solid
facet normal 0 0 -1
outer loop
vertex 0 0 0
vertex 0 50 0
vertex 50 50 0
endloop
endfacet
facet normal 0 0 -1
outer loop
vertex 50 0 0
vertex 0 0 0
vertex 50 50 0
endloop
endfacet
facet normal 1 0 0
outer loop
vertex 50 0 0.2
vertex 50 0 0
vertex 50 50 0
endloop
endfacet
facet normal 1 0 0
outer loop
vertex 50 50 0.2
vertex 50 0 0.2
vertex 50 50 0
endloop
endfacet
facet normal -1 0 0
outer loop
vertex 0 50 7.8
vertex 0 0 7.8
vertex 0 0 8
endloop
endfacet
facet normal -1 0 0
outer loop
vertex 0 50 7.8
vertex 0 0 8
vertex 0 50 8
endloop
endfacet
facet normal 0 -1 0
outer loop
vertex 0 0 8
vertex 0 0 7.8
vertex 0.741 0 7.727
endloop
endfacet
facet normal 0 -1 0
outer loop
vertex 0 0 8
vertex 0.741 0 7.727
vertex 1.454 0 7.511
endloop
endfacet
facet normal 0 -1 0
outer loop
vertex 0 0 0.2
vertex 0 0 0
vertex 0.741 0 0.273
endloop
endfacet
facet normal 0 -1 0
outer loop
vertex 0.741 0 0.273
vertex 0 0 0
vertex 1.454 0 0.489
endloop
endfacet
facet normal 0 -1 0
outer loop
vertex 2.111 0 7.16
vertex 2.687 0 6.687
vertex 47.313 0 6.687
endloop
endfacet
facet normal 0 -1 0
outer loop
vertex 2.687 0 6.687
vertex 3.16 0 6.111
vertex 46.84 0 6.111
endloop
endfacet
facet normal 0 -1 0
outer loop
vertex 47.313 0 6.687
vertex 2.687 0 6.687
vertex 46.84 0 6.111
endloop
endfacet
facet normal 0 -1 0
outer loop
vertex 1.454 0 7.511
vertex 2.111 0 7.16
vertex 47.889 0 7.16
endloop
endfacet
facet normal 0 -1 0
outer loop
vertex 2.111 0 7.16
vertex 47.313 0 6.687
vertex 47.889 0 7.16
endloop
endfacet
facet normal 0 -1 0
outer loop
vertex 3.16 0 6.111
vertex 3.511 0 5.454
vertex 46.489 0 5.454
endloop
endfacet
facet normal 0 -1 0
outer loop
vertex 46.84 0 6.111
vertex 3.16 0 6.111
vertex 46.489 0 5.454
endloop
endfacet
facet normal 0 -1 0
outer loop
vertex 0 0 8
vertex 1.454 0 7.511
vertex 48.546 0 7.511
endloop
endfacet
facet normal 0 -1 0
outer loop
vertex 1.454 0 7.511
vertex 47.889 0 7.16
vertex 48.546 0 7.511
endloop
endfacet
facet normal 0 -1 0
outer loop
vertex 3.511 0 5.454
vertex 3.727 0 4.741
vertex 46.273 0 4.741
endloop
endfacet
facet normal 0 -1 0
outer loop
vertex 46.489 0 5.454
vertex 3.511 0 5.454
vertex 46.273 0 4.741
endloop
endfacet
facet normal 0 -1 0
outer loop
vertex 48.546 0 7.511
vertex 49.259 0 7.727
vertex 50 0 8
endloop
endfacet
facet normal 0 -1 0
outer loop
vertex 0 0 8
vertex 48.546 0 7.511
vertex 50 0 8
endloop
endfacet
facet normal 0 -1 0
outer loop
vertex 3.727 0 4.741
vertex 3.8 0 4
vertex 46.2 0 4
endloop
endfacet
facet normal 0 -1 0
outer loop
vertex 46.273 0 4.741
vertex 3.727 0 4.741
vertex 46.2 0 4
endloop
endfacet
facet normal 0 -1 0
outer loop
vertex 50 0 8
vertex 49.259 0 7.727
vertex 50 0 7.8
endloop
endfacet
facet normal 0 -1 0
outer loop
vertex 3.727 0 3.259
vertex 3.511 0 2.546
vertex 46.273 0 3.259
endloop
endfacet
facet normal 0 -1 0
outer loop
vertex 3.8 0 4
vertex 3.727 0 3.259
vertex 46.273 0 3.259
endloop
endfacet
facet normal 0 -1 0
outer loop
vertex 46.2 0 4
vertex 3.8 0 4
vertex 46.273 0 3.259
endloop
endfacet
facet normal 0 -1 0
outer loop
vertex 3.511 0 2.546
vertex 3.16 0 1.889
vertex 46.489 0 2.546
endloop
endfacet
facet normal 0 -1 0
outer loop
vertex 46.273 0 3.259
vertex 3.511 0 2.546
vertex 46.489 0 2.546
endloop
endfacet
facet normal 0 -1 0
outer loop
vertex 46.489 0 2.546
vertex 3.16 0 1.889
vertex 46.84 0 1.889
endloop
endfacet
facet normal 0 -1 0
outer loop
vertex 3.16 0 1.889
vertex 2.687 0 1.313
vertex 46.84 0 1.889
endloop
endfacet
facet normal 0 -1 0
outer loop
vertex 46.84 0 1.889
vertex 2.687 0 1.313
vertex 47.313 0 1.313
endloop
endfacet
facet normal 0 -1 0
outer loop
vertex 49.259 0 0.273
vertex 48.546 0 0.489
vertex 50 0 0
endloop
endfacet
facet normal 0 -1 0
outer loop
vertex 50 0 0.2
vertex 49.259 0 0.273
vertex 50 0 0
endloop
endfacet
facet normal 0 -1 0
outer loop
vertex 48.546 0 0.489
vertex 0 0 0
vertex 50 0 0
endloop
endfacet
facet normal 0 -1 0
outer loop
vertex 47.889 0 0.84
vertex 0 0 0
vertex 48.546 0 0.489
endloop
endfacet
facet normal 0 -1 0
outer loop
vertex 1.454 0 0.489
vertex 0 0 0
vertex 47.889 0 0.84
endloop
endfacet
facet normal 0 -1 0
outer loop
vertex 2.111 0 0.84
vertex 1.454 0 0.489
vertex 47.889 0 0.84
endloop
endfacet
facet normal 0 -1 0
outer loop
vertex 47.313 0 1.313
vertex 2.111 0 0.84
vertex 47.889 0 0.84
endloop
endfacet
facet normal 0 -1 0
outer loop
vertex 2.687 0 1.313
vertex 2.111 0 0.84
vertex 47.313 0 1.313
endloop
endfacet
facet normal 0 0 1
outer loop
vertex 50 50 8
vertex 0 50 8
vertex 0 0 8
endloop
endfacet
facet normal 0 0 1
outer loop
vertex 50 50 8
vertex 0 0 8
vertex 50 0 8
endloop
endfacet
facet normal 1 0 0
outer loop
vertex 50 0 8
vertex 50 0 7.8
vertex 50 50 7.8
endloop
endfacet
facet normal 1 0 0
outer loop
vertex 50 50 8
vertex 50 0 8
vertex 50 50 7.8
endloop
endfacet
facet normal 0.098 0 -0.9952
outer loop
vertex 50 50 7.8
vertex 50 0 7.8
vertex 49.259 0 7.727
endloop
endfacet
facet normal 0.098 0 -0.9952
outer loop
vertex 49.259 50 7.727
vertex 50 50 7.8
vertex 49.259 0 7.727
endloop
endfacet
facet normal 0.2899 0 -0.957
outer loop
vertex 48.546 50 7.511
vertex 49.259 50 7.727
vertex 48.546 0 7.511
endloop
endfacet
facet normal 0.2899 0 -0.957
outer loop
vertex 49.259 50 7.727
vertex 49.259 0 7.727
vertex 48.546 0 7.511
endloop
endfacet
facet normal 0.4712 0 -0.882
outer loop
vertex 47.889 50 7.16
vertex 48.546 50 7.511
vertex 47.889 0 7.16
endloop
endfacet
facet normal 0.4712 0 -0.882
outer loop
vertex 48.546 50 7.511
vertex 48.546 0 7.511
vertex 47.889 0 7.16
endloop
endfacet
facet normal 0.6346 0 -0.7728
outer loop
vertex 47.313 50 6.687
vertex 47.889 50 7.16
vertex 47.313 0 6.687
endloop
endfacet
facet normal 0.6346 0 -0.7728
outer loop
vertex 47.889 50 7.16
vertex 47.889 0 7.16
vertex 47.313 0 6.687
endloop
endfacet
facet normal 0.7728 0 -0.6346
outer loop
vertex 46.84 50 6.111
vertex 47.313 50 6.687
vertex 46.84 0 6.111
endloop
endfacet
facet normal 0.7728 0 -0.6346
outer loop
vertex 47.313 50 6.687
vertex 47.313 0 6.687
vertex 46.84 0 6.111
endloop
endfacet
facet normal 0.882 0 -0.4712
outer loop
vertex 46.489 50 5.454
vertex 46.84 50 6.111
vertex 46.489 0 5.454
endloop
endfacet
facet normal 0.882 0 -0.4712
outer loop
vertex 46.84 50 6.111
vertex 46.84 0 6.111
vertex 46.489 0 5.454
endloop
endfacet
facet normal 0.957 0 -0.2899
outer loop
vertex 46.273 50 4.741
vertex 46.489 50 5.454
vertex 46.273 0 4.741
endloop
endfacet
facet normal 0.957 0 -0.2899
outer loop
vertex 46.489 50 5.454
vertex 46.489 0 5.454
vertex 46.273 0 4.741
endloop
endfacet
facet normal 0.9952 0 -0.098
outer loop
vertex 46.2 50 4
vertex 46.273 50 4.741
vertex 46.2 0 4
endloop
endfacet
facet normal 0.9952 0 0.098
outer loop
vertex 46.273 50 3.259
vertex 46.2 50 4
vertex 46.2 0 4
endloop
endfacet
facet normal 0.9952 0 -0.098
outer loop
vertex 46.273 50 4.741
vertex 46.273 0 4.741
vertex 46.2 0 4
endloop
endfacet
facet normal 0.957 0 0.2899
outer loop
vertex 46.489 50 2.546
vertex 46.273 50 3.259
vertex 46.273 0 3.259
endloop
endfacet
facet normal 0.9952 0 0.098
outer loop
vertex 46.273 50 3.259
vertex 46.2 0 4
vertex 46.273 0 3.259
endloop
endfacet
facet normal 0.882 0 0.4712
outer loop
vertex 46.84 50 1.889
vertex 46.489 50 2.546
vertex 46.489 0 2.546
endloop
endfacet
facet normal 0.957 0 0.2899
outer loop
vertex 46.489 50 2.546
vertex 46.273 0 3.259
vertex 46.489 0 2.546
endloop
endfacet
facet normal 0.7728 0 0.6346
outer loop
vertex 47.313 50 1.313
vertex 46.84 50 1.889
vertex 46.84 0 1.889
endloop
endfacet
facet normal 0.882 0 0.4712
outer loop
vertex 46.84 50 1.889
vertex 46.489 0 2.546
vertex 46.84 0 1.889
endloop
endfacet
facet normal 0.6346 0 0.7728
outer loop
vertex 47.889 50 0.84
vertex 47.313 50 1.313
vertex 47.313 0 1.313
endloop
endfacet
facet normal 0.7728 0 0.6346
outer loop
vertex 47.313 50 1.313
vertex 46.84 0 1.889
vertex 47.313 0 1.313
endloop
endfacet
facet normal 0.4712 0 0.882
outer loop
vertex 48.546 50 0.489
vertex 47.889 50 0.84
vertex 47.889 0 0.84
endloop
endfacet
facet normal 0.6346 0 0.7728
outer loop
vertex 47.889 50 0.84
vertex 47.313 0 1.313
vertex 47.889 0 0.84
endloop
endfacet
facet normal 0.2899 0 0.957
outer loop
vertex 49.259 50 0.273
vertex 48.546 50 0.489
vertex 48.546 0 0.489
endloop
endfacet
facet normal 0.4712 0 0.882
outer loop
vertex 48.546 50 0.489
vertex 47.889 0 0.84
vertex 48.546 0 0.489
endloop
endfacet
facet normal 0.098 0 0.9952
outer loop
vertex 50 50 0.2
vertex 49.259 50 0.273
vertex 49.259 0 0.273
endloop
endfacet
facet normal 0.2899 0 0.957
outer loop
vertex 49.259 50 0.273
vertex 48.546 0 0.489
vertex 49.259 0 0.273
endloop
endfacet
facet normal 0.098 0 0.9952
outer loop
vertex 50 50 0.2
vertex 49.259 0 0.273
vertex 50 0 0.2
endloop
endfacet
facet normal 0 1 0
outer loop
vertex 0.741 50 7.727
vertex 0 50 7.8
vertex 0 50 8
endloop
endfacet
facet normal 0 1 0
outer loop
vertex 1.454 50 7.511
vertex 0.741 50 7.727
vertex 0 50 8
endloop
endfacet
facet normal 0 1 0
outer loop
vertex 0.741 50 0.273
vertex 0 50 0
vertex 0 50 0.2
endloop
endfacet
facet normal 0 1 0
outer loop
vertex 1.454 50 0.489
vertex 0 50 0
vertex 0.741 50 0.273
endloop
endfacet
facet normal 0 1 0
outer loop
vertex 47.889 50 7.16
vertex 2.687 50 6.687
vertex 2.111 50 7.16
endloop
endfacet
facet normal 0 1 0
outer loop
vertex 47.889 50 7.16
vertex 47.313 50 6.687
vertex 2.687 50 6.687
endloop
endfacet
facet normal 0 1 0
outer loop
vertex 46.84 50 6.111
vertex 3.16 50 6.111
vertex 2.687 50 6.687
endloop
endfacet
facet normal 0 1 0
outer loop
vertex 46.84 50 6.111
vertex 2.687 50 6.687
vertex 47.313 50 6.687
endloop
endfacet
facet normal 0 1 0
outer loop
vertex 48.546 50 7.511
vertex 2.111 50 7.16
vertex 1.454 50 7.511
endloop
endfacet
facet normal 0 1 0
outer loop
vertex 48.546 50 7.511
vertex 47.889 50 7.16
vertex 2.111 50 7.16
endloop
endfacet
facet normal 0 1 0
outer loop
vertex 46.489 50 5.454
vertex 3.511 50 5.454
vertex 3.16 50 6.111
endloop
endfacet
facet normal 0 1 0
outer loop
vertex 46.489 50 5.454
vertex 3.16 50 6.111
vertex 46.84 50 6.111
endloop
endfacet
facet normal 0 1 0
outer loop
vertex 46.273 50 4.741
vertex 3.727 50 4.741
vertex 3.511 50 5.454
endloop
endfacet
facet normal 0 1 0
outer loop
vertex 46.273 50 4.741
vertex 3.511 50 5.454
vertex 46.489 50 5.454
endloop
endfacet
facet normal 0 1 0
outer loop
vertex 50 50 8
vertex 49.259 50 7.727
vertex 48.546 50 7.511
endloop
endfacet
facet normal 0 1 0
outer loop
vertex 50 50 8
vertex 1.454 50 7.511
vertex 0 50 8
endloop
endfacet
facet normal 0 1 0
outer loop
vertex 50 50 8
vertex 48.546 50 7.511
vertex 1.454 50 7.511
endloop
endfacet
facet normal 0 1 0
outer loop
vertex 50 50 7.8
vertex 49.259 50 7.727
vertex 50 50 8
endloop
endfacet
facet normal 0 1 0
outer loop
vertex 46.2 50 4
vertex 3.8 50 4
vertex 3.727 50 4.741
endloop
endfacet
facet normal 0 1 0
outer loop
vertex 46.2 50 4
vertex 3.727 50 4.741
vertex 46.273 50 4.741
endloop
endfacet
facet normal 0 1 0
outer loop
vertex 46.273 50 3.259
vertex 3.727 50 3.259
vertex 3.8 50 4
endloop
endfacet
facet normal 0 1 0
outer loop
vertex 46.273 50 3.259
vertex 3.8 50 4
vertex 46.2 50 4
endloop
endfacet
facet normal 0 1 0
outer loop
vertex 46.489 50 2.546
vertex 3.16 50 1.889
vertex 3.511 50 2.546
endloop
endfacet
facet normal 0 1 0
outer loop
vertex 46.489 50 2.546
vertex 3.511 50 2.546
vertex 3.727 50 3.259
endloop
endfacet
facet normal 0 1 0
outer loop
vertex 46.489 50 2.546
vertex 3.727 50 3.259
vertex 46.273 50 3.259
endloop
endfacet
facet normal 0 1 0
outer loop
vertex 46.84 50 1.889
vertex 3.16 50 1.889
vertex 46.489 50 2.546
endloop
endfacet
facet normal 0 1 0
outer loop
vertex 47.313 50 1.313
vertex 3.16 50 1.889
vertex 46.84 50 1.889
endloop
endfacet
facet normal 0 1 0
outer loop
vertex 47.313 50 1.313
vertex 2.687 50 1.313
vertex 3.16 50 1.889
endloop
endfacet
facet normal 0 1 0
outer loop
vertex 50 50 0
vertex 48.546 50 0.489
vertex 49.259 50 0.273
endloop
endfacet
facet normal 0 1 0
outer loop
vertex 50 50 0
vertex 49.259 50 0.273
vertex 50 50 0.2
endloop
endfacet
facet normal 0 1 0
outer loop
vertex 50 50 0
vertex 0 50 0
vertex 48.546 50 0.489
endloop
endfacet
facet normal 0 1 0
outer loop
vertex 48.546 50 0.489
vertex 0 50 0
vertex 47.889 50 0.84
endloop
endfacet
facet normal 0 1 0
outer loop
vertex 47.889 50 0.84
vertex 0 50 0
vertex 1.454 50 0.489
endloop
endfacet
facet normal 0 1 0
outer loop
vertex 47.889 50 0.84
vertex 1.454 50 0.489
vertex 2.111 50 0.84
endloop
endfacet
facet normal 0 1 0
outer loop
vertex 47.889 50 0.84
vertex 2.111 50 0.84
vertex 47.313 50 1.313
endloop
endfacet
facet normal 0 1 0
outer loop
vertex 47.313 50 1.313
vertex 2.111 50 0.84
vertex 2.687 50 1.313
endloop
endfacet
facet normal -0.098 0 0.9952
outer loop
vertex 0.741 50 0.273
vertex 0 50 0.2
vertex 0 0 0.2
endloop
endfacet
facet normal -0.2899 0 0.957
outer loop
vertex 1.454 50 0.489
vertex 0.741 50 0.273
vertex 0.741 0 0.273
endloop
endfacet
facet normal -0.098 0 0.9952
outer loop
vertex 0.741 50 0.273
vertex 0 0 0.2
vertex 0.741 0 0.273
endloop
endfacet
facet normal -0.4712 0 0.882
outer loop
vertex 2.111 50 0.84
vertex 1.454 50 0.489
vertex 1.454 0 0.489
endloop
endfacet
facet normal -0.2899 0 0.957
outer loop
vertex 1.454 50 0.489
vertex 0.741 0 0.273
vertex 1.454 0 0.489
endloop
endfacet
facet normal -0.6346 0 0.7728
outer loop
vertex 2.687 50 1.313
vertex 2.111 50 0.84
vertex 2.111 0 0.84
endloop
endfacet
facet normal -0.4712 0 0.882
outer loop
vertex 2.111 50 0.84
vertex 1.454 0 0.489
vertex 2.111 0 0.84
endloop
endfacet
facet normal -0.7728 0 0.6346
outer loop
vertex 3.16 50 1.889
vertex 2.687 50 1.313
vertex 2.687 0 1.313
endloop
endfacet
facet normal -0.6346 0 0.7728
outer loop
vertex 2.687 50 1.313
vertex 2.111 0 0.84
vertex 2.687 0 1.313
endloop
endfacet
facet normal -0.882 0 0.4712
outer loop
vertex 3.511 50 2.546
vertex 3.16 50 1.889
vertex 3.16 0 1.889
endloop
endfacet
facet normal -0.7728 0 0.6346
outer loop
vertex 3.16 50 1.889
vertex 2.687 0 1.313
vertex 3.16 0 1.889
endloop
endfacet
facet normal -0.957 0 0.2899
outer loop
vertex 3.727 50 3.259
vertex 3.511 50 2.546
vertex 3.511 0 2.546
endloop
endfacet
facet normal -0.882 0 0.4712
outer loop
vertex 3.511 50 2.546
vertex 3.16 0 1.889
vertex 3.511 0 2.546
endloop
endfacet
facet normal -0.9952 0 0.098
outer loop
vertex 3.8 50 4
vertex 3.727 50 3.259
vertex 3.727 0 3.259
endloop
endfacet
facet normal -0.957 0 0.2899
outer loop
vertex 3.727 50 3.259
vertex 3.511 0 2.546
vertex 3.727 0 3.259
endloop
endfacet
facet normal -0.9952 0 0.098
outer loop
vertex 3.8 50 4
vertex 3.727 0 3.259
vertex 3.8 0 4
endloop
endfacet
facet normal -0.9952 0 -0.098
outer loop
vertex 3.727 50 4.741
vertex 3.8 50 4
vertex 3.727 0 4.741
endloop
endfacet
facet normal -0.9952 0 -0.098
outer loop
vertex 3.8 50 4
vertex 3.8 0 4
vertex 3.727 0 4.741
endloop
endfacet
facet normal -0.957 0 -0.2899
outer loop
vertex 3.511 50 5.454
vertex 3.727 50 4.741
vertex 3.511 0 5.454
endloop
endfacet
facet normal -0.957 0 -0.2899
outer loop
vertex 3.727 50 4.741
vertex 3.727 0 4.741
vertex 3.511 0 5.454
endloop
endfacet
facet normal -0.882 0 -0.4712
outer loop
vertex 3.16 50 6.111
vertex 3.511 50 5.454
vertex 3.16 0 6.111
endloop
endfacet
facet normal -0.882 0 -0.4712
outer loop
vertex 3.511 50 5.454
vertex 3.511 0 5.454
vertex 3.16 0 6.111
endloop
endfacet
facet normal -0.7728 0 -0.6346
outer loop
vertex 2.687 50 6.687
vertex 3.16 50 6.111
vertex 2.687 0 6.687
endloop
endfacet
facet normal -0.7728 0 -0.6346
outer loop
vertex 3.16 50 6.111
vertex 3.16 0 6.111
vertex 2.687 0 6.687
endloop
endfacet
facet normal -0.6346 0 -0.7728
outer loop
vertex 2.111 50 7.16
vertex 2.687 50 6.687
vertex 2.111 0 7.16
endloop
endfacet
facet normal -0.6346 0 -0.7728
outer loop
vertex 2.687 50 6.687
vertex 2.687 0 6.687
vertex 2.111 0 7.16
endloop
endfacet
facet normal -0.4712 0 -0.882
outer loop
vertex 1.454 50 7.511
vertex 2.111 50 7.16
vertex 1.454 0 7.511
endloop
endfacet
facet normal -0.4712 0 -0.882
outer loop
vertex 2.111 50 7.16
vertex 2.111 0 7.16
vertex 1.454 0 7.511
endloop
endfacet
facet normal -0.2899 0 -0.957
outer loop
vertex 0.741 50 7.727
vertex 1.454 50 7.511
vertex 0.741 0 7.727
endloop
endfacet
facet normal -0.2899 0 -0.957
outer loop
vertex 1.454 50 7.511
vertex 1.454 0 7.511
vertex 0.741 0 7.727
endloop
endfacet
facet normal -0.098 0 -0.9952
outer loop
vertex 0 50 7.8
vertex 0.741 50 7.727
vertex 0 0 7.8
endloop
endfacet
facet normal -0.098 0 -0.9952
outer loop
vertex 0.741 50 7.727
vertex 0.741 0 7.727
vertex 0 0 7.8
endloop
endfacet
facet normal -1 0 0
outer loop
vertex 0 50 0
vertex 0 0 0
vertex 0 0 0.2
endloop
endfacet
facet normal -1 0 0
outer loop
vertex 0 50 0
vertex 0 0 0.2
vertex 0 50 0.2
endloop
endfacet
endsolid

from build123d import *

# Parameters (mm, degrees)
SKETCH1_W           = 50
SKETCH1_H           = 50
BOSS_EXTRUDE3_DEPTH = 8
SKETCH6_R           = 3.8
CUT_EXTRUDE2_DEPTH  = 68


with BuildPart() as part:
    # Sketch1 → Boss-Extrude3 (new body)
    with BuildSketch(Plane.XY):
        with Locations((25, 25)):
            Rectangle(SKETCH1_W, SKETCH1_H)
    extrude(amount=BOSS_EXTRUDE3_DEPTH)

    # Sketch6 → Cut-Extrude2 (cut)
    with BuildSketch(Plane.XZ):
        with Locations((0, 4)):
            Circle(SKETCH6_R)
        with Locations((50, 4)):
            Circle(SKETCH6_R)
    extrude(amount=-CUT_EXTRUDE2_DEPTH, mode=Mode.SUBTRACT)


solid = part.part
